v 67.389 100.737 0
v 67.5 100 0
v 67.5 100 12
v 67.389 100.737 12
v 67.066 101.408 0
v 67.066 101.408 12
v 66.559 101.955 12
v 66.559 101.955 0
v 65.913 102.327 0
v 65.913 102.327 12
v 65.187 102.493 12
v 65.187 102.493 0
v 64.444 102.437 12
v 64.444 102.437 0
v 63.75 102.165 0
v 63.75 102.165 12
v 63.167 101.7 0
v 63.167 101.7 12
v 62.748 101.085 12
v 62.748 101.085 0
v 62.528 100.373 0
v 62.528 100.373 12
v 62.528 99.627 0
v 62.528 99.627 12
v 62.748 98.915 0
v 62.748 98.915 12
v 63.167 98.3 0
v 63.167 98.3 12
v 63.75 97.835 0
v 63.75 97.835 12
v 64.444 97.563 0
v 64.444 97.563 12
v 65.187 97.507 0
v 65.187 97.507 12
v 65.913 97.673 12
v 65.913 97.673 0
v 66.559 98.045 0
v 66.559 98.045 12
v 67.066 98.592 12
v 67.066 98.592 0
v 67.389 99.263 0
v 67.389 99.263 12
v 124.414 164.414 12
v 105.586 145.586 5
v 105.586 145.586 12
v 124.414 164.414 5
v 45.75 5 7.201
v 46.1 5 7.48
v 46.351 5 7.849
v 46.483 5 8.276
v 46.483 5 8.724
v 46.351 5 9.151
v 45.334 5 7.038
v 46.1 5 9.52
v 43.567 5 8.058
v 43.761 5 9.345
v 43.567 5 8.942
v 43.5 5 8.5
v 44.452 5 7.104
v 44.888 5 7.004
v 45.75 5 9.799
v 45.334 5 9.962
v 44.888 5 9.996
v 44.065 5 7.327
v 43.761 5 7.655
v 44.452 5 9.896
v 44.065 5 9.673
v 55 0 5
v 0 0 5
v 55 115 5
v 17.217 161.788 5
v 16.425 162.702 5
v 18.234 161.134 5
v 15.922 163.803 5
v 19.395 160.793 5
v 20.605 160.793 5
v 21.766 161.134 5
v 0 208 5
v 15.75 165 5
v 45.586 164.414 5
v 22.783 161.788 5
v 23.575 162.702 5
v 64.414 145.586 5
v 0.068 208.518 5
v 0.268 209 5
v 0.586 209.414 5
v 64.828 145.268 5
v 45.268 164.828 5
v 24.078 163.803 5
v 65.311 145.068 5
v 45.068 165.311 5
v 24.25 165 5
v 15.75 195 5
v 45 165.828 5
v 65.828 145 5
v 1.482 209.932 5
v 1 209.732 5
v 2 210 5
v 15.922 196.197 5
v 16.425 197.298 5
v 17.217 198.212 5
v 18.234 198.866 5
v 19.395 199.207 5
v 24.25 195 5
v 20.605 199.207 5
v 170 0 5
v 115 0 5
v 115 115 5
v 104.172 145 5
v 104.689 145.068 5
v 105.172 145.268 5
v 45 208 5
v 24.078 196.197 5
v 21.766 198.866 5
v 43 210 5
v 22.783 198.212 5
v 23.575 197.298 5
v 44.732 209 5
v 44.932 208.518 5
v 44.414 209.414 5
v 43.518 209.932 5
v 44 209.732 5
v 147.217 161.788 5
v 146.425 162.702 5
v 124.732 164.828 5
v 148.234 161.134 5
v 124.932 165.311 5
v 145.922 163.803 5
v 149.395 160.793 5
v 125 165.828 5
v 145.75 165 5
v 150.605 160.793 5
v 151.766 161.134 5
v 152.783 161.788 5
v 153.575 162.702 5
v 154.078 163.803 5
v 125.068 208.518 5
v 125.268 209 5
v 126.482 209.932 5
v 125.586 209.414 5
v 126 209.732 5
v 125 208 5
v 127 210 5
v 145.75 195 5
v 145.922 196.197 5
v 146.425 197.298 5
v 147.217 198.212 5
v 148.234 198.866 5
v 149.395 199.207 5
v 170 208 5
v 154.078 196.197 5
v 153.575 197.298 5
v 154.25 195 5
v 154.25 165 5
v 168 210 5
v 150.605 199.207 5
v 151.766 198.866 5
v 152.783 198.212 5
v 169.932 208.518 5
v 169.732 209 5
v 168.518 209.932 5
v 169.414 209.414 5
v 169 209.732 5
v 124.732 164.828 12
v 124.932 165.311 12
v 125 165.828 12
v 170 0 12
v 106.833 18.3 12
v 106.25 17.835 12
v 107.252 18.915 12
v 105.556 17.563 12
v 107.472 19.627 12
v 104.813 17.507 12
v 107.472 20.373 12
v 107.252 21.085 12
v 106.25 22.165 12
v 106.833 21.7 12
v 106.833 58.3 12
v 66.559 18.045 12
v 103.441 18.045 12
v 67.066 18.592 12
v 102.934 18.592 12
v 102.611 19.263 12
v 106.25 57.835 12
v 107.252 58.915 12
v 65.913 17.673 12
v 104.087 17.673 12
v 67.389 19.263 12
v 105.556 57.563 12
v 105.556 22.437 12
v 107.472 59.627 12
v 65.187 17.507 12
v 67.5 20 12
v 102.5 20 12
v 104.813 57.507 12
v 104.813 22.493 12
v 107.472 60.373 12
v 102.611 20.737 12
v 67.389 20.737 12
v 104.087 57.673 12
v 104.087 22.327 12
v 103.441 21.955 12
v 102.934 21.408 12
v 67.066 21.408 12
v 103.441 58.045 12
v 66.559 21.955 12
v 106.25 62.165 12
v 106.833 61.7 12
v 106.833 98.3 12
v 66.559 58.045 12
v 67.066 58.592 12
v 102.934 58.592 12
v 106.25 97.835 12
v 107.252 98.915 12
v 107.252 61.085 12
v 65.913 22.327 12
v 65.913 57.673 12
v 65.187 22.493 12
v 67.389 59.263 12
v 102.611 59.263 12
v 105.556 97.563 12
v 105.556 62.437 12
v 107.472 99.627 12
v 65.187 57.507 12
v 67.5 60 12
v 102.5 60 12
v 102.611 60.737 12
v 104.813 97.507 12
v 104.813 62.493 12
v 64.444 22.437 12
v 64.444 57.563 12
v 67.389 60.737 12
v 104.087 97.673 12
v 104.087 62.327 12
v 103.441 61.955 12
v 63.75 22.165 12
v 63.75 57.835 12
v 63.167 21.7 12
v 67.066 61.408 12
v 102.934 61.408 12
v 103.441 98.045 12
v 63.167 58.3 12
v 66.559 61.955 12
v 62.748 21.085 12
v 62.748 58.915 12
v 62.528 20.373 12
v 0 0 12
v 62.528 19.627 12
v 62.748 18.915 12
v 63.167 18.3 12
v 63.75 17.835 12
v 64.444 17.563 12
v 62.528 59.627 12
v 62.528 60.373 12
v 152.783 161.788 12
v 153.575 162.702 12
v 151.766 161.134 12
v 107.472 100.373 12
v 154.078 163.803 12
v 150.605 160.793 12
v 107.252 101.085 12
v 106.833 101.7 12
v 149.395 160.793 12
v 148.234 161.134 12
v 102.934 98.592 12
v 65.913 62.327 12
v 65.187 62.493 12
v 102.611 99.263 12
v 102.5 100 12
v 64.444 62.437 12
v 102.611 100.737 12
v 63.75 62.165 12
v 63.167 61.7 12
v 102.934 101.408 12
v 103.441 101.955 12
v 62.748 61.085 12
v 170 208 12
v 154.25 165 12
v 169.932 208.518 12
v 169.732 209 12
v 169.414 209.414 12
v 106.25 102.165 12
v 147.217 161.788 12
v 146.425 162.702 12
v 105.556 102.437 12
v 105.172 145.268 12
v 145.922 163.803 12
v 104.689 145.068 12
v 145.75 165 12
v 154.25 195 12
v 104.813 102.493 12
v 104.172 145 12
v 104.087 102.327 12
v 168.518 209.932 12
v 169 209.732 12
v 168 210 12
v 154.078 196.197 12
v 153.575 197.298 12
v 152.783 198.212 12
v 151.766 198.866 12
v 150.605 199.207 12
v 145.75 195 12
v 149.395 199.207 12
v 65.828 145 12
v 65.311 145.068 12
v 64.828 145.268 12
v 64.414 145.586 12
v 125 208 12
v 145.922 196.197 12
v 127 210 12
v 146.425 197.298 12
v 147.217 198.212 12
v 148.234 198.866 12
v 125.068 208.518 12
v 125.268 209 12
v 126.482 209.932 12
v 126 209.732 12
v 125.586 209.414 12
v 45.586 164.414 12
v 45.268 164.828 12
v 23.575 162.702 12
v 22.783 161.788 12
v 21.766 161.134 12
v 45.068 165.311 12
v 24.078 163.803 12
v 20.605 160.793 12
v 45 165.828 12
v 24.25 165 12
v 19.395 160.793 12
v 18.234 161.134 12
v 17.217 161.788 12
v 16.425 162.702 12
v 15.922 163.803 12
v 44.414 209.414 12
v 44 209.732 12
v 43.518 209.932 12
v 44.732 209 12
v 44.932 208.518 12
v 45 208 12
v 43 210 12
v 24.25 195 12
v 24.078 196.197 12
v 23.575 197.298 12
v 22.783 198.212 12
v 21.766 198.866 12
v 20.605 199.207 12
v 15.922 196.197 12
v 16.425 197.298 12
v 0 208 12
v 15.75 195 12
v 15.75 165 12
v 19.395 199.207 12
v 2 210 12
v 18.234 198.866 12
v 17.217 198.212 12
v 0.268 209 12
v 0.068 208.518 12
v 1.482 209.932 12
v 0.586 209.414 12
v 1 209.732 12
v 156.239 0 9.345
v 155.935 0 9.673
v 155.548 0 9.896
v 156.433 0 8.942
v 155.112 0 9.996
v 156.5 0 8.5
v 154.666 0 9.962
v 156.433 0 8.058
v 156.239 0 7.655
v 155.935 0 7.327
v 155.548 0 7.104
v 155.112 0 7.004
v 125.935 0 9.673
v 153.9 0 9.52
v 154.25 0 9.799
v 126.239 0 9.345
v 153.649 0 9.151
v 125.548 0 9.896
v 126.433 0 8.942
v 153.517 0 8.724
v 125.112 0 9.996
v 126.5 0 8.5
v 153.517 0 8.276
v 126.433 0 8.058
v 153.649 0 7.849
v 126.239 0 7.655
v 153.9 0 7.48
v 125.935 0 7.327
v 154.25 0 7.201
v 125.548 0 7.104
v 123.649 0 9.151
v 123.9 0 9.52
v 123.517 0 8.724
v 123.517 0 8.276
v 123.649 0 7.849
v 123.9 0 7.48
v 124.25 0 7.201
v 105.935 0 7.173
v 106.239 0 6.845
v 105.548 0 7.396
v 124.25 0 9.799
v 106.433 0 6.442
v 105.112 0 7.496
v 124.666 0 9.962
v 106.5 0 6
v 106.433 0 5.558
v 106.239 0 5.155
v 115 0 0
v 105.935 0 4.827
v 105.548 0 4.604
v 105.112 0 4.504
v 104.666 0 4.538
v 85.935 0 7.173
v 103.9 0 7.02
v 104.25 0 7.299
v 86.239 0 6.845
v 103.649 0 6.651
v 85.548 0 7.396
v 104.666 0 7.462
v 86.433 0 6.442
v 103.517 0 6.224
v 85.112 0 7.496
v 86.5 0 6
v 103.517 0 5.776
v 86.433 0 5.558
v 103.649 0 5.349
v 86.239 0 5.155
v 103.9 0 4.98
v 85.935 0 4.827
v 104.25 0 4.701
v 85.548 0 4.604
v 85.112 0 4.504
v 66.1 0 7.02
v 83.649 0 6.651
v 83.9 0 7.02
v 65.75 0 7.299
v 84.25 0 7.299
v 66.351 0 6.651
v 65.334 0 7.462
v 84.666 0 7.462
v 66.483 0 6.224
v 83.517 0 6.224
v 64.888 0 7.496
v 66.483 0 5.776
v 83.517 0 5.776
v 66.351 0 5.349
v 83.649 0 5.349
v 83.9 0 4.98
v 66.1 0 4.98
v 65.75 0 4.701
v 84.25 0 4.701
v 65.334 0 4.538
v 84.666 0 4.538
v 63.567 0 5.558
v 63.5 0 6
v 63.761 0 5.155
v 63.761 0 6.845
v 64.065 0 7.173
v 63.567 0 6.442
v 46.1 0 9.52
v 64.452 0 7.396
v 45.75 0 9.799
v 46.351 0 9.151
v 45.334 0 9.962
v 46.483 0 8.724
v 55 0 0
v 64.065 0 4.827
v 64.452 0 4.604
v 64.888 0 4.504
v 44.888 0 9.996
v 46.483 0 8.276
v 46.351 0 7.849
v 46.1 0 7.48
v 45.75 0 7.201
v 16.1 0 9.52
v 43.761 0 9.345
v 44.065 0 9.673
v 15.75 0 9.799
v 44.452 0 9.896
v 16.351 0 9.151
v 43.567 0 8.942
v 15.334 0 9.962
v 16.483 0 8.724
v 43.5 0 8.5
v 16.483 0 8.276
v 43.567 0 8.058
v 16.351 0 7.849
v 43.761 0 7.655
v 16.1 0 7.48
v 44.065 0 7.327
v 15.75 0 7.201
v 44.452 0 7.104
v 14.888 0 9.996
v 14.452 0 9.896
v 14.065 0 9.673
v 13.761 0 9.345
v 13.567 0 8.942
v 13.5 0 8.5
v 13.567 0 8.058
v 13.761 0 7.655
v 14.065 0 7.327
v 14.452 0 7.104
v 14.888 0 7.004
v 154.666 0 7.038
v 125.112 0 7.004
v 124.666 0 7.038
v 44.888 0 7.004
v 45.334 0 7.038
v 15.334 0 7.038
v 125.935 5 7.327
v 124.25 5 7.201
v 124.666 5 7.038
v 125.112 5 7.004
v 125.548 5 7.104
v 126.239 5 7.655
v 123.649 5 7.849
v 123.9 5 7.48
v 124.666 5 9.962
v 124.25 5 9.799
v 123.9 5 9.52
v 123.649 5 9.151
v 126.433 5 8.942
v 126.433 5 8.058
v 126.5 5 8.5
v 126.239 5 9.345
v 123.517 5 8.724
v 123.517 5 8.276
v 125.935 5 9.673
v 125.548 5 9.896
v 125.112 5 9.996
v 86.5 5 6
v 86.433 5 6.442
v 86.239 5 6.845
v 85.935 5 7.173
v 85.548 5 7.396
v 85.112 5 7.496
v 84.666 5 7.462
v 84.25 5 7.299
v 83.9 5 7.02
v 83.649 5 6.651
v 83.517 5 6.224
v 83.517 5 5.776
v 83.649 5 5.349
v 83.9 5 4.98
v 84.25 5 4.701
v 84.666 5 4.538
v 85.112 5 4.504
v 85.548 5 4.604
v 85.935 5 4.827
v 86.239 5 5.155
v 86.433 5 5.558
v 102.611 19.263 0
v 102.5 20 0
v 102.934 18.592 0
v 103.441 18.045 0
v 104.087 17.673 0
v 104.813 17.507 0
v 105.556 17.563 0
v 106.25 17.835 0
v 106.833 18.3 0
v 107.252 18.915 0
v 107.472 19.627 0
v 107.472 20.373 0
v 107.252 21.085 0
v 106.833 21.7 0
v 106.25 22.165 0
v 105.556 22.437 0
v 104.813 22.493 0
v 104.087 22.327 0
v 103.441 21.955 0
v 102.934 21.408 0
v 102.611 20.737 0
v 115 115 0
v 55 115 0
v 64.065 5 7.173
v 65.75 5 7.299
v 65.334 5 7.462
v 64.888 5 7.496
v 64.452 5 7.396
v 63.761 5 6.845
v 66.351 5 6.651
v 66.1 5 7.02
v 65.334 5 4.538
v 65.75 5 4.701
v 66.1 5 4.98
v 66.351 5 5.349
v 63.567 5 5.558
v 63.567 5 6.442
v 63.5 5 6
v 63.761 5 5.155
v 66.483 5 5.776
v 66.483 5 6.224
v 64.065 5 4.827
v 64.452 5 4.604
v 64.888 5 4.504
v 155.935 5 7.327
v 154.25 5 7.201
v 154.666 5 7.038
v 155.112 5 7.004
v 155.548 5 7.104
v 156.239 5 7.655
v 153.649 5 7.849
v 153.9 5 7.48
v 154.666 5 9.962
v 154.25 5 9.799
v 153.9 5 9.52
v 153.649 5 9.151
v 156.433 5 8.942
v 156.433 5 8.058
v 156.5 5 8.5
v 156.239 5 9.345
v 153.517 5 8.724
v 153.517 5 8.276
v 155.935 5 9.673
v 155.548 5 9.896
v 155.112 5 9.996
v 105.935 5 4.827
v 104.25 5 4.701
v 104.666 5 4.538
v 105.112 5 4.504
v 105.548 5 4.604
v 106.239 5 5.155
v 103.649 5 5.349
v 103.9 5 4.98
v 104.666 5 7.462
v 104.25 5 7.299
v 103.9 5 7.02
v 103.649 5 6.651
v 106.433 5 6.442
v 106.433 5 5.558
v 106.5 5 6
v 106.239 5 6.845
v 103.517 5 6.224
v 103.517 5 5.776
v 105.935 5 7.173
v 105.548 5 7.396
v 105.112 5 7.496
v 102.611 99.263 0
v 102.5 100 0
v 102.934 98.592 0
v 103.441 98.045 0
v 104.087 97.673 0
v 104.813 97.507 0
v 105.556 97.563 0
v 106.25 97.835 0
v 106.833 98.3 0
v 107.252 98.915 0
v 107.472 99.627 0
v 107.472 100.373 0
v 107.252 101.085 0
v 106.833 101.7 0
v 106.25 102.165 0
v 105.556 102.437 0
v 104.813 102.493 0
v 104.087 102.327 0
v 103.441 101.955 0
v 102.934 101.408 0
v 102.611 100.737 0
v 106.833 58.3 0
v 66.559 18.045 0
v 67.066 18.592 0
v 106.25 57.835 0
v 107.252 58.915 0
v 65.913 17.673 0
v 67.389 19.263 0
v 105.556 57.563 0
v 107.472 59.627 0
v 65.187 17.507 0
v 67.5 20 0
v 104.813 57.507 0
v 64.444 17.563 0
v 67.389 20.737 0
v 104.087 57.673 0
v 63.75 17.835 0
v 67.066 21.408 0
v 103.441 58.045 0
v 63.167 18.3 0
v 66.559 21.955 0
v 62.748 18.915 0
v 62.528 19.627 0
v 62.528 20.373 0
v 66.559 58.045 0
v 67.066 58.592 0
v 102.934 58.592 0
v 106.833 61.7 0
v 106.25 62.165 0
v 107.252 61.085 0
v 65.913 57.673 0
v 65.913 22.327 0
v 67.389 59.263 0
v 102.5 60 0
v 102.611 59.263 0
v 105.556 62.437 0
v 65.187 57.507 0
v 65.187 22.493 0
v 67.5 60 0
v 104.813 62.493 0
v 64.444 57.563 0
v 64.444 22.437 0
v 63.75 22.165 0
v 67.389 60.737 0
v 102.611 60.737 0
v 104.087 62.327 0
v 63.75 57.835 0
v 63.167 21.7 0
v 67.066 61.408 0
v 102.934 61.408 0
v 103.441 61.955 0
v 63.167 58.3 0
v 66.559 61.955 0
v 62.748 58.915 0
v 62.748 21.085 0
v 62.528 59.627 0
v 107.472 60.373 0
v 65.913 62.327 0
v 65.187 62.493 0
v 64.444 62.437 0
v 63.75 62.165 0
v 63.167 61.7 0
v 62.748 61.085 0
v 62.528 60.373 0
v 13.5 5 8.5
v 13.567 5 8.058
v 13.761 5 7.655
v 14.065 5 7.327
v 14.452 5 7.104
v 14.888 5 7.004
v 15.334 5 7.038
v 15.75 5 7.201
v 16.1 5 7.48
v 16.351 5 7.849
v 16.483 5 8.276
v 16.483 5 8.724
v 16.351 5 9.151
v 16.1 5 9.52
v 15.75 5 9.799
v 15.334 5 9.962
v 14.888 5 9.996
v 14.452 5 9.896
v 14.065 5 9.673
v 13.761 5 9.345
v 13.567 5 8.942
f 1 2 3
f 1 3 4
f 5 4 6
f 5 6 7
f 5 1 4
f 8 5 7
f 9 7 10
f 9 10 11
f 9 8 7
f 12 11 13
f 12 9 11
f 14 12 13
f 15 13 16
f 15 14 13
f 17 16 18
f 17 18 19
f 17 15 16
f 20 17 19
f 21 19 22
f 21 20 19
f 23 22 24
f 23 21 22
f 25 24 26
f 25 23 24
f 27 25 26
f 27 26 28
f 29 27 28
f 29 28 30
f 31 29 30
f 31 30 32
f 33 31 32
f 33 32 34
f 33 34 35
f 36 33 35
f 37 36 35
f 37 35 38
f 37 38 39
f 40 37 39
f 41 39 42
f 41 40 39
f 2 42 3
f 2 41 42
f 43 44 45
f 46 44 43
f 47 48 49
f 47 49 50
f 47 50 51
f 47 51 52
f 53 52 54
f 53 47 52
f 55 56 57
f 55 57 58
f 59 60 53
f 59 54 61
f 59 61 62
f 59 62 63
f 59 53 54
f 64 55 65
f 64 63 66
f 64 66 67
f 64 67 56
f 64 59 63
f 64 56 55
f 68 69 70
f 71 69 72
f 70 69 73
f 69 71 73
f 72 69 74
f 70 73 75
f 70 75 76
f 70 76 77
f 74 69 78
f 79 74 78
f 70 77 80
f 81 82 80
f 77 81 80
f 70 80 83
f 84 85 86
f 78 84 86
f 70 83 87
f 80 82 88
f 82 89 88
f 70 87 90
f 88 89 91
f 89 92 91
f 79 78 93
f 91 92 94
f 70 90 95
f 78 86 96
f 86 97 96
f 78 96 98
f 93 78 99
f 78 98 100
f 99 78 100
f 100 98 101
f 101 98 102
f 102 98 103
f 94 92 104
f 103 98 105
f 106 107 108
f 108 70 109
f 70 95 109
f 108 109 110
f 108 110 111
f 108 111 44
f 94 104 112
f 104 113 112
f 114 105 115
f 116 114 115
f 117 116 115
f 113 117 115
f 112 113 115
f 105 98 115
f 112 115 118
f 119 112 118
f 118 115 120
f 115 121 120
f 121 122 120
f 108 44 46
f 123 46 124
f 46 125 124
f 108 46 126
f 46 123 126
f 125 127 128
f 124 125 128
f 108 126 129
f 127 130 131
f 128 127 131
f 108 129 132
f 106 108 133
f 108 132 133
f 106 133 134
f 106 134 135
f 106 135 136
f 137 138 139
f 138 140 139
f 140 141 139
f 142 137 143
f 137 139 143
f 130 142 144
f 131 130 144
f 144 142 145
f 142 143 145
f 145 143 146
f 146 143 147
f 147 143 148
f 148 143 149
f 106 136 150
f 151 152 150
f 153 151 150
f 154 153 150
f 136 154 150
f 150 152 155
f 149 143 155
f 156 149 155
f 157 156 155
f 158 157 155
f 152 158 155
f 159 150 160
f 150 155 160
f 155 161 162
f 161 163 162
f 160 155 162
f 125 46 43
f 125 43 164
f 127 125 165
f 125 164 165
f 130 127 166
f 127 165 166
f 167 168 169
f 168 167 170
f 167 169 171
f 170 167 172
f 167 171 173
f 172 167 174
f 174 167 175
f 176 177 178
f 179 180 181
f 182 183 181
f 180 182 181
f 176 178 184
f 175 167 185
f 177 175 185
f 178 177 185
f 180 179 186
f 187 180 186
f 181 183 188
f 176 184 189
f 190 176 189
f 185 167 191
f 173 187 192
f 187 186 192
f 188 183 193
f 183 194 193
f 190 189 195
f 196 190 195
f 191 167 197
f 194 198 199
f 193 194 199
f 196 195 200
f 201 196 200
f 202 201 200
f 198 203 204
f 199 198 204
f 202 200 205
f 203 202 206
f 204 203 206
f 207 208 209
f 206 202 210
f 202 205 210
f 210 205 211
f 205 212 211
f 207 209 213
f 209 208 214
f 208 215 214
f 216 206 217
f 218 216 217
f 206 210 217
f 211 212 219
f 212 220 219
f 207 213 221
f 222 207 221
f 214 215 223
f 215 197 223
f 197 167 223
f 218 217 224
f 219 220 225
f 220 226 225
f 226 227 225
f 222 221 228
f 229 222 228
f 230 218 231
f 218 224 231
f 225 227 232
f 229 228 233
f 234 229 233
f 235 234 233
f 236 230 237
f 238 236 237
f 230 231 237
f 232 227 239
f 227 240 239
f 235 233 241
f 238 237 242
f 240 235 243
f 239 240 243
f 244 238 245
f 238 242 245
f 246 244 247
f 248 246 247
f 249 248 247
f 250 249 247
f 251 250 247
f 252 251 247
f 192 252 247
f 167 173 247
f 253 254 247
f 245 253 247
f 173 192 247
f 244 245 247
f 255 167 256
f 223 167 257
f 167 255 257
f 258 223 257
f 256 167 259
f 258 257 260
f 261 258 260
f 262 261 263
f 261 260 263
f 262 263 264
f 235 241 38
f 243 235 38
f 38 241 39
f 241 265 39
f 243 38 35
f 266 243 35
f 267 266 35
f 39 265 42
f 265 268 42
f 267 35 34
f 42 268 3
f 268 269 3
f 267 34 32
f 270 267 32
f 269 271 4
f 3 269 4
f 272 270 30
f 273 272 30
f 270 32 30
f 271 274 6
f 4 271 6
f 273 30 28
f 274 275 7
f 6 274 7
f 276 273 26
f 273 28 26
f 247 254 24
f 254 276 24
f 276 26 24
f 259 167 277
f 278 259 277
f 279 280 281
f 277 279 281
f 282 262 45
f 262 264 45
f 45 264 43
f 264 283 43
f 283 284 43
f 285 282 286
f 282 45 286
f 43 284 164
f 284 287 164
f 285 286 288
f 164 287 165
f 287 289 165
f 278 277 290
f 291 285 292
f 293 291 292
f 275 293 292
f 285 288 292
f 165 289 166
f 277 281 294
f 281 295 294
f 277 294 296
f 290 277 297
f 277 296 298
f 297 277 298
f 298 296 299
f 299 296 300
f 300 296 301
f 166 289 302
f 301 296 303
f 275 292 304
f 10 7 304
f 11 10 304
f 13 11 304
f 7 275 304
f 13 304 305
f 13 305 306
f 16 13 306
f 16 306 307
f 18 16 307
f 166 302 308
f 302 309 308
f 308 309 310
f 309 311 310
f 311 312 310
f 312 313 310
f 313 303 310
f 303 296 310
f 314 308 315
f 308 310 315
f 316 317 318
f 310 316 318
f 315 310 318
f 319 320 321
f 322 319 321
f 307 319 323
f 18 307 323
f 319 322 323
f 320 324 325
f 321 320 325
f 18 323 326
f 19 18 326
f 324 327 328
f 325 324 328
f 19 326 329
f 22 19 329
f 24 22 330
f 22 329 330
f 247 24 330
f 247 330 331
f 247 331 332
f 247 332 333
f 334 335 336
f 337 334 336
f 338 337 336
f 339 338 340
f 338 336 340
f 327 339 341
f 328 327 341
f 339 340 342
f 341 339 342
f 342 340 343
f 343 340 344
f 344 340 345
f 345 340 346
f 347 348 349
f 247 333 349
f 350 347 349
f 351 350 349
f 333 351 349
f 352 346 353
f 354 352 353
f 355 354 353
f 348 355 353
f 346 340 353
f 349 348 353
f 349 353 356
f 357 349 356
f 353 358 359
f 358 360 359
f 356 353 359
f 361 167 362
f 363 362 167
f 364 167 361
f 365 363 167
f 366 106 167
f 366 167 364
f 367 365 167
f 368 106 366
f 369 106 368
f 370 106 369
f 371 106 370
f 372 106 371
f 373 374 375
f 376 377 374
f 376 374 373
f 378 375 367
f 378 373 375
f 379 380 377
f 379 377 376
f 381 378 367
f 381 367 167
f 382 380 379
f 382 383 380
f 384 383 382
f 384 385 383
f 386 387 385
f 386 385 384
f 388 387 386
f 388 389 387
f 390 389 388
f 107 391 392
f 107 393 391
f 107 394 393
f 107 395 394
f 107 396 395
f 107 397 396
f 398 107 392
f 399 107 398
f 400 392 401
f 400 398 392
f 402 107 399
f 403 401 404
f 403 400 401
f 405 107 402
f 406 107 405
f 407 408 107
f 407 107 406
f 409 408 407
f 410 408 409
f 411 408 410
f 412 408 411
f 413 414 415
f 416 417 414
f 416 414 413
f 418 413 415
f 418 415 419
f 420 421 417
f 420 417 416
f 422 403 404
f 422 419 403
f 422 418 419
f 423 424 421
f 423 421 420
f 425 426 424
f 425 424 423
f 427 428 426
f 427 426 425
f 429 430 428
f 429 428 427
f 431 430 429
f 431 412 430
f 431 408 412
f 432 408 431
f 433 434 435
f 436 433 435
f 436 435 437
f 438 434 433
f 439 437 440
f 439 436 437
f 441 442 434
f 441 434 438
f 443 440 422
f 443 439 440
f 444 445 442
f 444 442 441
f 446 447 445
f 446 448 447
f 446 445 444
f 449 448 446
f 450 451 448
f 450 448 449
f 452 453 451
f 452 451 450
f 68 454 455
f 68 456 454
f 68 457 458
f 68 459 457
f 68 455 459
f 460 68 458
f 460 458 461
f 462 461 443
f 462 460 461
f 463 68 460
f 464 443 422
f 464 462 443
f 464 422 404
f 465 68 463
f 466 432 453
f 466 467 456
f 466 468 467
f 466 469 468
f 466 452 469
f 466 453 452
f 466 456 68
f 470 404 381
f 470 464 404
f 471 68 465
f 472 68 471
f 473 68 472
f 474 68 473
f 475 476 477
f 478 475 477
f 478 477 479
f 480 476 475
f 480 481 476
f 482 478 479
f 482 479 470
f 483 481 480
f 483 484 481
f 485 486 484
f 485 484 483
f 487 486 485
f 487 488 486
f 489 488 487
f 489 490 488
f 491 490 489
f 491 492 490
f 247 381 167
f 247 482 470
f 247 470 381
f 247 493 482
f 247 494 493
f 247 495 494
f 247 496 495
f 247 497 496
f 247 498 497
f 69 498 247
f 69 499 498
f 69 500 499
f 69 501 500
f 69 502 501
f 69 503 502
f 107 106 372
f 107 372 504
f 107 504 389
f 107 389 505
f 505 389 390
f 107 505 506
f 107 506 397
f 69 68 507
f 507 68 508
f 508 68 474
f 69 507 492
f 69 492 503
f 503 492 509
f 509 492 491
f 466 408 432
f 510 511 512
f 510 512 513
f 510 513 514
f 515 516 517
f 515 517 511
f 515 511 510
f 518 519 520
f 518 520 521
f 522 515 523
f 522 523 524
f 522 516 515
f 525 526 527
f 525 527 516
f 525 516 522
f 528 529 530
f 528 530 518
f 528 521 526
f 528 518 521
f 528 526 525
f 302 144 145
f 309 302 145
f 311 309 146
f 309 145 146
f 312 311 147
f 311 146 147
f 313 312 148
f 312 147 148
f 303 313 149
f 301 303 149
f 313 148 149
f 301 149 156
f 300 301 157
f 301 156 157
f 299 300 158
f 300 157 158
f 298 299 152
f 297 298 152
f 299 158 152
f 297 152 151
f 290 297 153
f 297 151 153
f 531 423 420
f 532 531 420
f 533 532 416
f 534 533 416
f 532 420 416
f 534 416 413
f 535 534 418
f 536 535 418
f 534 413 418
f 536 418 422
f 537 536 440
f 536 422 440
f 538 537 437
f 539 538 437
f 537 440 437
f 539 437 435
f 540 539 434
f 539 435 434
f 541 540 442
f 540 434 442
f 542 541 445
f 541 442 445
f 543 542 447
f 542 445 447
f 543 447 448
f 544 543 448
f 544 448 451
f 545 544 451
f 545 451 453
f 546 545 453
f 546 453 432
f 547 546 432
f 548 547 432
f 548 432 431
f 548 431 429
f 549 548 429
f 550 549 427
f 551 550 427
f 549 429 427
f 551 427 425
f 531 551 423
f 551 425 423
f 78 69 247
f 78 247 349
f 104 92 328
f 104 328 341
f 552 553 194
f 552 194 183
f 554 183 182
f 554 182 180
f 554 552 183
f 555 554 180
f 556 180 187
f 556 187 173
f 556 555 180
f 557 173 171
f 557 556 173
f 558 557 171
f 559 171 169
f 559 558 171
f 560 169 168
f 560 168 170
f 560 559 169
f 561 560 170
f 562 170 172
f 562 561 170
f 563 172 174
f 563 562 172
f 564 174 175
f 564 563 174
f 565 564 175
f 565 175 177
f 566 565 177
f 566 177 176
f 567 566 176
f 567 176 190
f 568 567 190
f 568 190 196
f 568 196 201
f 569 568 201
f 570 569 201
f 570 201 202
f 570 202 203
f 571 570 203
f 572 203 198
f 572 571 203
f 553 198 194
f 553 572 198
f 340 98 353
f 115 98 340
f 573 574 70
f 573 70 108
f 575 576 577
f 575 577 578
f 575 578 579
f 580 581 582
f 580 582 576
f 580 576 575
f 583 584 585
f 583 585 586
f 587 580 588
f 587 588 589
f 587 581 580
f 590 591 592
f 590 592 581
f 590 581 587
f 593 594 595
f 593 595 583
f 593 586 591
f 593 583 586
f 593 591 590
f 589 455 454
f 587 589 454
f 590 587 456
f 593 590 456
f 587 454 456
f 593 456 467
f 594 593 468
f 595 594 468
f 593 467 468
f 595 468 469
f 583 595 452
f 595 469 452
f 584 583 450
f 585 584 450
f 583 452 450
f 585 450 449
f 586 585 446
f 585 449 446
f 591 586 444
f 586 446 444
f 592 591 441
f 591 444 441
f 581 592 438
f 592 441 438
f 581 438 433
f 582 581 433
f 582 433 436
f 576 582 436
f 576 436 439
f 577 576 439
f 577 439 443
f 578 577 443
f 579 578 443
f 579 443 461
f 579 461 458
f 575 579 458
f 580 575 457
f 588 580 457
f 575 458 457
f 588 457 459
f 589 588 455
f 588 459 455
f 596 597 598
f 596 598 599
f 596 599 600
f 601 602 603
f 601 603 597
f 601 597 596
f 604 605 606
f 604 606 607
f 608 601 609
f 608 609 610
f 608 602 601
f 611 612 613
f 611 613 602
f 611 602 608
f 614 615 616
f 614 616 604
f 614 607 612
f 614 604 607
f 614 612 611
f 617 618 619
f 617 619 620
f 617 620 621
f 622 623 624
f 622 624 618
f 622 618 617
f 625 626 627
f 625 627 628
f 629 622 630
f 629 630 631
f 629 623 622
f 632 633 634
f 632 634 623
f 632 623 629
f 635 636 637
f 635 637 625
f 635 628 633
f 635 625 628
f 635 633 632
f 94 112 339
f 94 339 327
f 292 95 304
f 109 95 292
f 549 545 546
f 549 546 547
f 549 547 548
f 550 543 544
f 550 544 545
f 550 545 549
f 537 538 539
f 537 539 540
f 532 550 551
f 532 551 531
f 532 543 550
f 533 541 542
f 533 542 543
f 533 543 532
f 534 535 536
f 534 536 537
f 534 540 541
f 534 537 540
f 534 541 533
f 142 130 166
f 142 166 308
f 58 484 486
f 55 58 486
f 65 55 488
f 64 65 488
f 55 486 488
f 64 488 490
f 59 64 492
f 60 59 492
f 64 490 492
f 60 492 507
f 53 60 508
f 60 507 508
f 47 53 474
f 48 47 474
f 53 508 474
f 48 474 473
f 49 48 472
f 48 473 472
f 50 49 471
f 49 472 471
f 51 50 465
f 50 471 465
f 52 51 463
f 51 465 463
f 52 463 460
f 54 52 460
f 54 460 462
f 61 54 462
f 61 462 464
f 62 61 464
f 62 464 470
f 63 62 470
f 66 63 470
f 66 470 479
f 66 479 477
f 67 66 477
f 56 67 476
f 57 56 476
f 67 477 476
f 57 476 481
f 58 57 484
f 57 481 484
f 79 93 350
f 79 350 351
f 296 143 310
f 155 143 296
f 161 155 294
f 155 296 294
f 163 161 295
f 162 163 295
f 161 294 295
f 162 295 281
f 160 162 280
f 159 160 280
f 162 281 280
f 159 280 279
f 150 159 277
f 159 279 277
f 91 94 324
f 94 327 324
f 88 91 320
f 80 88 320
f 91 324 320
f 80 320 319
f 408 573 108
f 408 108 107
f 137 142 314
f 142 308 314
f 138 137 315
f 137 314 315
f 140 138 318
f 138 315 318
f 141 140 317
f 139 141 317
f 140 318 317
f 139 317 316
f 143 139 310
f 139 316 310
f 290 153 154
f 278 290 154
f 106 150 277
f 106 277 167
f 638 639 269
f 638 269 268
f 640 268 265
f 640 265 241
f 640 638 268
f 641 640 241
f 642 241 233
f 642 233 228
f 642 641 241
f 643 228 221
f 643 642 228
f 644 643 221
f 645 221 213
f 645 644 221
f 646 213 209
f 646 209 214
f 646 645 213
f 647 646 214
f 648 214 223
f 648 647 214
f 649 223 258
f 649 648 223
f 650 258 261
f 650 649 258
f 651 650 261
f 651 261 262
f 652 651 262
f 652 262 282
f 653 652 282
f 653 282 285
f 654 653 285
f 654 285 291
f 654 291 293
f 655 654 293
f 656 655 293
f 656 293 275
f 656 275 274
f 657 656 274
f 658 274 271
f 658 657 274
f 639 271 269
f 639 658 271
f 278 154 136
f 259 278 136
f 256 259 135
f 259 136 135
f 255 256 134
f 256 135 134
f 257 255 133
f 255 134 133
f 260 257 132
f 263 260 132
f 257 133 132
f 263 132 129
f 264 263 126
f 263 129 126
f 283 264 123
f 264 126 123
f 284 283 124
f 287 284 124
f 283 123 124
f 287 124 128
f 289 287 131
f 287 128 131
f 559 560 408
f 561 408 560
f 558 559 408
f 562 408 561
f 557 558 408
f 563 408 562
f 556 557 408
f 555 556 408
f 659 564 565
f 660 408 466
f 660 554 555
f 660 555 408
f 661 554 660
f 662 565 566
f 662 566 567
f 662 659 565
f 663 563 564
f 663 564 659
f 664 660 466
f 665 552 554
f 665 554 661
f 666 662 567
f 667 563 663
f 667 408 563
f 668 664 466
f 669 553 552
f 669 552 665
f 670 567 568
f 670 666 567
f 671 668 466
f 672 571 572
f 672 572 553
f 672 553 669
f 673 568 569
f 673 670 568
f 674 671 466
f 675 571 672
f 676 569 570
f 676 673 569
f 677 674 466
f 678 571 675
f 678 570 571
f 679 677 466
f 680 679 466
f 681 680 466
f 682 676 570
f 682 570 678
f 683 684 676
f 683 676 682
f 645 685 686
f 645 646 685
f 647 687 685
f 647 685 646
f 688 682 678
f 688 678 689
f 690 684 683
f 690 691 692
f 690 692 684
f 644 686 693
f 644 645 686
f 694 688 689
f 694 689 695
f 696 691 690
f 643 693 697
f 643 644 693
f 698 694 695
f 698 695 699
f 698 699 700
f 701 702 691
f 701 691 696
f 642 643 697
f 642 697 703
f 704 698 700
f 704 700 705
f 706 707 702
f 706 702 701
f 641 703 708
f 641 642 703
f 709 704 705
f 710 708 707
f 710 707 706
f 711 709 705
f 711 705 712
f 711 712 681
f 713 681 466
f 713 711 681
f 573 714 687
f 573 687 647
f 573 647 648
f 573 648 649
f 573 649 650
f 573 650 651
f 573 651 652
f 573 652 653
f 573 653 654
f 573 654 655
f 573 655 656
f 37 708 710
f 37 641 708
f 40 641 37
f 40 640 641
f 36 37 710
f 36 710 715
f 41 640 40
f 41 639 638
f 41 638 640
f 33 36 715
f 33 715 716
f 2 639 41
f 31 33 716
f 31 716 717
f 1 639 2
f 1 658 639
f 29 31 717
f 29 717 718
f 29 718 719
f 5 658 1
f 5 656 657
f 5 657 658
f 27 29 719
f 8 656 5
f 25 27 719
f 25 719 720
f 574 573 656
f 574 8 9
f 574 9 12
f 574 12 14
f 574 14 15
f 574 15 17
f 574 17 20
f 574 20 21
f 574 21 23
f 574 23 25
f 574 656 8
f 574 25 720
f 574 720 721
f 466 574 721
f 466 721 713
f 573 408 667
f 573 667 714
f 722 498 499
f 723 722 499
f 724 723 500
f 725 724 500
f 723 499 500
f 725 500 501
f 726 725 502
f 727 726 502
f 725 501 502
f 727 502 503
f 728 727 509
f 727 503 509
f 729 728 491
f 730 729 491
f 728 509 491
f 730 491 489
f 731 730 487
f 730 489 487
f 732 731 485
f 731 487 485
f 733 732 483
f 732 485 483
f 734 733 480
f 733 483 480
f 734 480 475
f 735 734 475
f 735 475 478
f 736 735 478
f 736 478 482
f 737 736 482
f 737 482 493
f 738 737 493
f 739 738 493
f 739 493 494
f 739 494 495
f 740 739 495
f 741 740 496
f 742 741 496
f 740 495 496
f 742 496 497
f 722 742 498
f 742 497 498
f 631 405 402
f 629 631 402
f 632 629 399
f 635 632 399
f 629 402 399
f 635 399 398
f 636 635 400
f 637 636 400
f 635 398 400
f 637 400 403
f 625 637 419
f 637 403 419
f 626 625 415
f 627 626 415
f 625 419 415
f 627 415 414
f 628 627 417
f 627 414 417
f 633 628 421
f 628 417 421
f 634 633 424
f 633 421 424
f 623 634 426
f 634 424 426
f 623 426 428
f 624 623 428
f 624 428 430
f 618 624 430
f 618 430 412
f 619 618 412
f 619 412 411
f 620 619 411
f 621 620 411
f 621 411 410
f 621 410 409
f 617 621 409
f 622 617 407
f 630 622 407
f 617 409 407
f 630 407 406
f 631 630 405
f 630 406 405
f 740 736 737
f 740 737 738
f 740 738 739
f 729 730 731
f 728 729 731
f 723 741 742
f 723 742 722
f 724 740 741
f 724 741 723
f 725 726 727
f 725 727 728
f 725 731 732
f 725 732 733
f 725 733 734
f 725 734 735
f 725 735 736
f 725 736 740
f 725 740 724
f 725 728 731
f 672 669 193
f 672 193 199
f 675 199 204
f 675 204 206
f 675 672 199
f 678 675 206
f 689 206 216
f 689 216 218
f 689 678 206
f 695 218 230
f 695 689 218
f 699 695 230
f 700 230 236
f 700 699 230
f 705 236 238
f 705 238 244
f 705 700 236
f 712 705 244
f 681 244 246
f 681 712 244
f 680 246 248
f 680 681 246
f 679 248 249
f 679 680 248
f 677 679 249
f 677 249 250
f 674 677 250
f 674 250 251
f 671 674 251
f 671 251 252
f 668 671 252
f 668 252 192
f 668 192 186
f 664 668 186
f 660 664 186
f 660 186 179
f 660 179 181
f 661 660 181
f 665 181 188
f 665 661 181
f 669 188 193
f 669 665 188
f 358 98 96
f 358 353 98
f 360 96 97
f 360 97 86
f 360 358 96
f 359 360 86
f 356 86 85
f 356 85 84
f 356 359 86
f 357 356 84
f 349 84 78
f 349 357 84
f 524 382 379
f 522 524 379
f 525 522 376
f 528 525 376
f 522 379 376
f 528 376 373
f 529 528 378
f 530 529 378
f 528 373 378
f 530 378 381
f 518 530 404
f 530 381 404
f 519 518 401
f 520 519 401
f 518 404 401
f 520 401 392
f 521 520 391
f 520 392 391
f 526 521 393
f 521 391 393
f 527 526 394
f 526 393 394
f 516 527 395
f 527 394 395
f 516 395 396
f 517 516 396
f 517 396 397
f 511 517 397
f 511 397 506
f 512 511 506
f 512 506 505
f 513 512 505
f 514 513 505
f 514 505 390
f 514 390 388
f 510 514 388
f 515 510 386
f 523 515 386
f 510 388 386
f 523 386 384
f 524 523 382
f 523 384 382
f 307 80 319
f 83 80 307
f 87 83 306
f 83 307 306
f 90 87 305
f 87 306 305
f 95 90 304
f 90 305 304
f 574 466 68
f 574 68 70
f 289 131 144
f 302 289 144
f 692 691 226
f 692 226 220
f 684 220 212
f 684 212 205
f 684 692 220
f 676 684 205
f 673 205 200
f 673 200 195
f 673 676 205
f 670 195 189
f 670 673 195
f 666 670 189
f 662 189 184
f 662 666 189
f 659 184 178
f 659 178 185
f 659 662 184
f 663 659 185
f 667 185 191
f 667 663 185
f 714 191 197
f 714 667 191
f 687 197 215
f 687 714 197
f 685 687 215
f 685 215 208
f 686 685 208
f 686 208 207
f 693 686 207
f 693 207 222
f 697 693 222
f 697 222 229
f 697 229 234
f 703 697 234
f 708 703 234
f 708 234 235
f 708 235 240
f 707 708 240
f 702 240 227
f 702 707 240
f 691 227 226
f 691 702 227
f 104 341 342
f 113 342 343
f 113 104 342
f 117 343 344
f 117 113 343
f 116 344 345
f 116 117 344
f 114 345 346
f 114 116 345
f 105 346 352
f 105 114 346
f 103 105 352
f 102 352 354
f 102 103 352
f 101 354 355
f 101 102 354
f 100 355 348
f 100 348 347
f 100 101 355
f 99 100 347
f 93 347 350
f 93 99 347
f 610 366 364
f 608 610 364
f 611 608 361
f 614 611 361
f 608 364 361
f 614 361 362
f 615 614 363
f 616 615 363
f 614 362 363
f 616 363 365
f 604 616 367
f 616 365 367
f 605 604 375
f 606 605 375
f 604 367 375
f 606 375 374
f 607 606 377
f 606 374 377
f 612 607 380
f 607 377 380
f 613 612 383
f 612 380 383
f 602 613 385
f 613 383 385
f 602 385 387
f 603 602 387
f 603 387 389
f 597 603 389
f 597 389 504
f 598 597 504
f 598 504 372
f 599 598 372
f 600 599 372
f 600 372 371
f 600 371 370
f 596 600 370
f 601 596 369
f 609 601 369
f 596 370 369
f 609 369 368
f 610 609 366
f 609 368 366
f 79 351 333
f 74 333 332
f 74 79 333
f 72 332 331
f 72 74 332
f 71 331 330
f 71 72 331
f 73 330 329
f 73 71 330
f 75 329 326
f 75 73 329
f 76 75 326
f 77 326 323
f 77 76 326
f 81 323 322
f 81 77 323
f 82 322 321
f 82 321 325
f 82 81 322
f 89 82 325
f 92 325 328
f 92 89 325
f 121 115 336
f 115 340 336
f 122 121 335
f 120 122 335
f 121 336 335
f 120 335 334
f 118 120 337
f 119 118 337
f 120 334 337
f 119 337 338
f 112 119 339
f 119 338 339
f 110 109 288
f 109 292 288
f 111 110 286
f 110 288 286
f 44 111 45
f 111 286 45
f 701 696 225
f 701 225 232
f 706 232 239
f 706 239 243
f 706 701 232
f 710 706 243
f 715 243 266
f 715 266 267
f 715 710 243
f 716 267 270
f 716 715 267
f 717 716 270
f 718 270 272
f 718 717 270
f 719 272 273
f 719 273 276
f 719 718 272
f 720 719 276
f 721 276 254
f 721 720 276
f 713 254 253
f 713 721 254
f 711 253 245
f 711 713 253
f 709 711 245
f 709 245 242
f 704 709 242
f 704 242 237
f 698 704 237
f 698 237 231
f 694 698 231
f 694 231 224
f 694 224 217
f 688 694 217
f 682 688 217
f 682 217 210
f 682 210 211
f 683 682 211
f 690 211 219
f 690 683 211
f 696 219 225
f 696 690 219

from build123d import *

# Parameters (mm, degrees)
SKETCH1_R           = 2.5
BOSS_EXTRUDE1_DEPTH = 12
CUT_EXTRUDE1_DEPTH  = 5
FILLET1_R           = 2
SKETCH4_R           = 1.5
CUT_EXTRUDE2_DEPTH  = 5


with BuildPart() as part:
    # Sketch1 → Boss-Extrude1 (new body)
    with BuildSketch(Plane.XY):
        Polygon((0, 210), (45, 210), (45, 165), (65, 145), (105, 145), (125, 165), (125, 210), (170, 210), (170, 0), (0, 0), align=None)
        with Locations((65, 20)):
            Circle(SKETCH1_R, mode=Mode.SUBTRACT)
        with Locations((65, 60)):
            Circle(SKETCH1_R, mode=Mode.SUBTRACT)
        with Locations((65, 100)):
            Circle(SKETCH1_R, mode=Mode.SUBTRACT)
        with Locations(Location((105, 100, 0), (0, 0, 180))):
            Circle(SKETCH1_R, mode=Mode.SUBTRACT)
        with Locations(Location((105, 60, 0), (0, 0, 180))):
            Circle(SKETCH1_R, mode=Mode.SUBTRACT)
        with Locations(Location((105, 20, 0), (0, 0, 180))):
            Circle(SKETCH1_R, mode=Mode.SUBTRACT)
        with BuildLine():
            Line((154.25, 195), (154.25, 165))
            ThreePointArc((154.25, 165), (150, 160.75), (145.75, 165))
            Line((145.75, 165), (145.75, 195))
            ThreePointArc((145.75, 195), (150, 199.25), (154.25, 195))
        make_face(mode=Mode.SUBTRACT)
        with BuildLine():
            Line((15.75, 195), (15.75, 165))
            ThreePointArc((15.75, 165), (20, 160.75), (24.25, 165))
            Line((24.25, 165), (24.25, 195))
            ThreePointArc((24.25, 195), (20, 199.25), (15.75, 195))
        make_face(mode=Mode.SUBTRACT)
    extrude(amount=BOSS_EXTRUDE1_DEPTH)

    # Sketch3 → Cut-Extrude1 (cut)
    with BuildSketch(Plane(origin=(0, 0, 0), x_dir=(-1, 0, 0), z_dir=(0, 0, -1))):
        Polygon((0, 0), (-55, 0), (-55, 115), (-115, 115), (-115, 0), (-170, 0), (-170, 210), (-115, 210), (-55, 210), (0, 210), align=None)
    extrude(amount=-CUT_EXTRUDE1_DEPTH, mode=Mode.SUBTRACT)

    # Fillet1
    fillet1_edges = [part.edges().sort_by_distance(p)[0] for p in [
        (0, 210, 8.5),
        (45, 210, 8.5),
        (45, 165, 8.5),
        (65, 145, 8.5),
        (105, 145, 8.5),
        (125, 165, 8.5),
        (125, 210, 8.5),
        (170, 210, 8.5),
    ]]
    fillet(fillet1_edges, radius=FILLET1_R)

    # Sketch4 → Cut-Extrude2 (cut)
    with BuildSketch(Plane.XZ):
        with Locations((85, 6)):
            Circle(SKETCH4_R)
        with Locations((105, 6)):
            Circle(SKETCH4_R)
        with Locations((155, 8.5)):
            Circle(SKETCH4_R)
        with Locations((125, 8.5)):
            Circle(SKETCH4_R)
        with Locations(Location((15, 8.5, 0), (0, 0, 180))):
            Circle(SKETCH4_R)
        with Locations(Location((45, 8.5, 0), (0, 0, 180))):
            Circle(SKETCH4_R)
        with Locations(Location((65, 6, 0), (0, 0, 180))):
            Circle(SKETCH4_R)
    extrude(amount=-CUT_EXTRUDE2_DEPTH, mode=Mode.SUBTRACT)


solid = part.part
